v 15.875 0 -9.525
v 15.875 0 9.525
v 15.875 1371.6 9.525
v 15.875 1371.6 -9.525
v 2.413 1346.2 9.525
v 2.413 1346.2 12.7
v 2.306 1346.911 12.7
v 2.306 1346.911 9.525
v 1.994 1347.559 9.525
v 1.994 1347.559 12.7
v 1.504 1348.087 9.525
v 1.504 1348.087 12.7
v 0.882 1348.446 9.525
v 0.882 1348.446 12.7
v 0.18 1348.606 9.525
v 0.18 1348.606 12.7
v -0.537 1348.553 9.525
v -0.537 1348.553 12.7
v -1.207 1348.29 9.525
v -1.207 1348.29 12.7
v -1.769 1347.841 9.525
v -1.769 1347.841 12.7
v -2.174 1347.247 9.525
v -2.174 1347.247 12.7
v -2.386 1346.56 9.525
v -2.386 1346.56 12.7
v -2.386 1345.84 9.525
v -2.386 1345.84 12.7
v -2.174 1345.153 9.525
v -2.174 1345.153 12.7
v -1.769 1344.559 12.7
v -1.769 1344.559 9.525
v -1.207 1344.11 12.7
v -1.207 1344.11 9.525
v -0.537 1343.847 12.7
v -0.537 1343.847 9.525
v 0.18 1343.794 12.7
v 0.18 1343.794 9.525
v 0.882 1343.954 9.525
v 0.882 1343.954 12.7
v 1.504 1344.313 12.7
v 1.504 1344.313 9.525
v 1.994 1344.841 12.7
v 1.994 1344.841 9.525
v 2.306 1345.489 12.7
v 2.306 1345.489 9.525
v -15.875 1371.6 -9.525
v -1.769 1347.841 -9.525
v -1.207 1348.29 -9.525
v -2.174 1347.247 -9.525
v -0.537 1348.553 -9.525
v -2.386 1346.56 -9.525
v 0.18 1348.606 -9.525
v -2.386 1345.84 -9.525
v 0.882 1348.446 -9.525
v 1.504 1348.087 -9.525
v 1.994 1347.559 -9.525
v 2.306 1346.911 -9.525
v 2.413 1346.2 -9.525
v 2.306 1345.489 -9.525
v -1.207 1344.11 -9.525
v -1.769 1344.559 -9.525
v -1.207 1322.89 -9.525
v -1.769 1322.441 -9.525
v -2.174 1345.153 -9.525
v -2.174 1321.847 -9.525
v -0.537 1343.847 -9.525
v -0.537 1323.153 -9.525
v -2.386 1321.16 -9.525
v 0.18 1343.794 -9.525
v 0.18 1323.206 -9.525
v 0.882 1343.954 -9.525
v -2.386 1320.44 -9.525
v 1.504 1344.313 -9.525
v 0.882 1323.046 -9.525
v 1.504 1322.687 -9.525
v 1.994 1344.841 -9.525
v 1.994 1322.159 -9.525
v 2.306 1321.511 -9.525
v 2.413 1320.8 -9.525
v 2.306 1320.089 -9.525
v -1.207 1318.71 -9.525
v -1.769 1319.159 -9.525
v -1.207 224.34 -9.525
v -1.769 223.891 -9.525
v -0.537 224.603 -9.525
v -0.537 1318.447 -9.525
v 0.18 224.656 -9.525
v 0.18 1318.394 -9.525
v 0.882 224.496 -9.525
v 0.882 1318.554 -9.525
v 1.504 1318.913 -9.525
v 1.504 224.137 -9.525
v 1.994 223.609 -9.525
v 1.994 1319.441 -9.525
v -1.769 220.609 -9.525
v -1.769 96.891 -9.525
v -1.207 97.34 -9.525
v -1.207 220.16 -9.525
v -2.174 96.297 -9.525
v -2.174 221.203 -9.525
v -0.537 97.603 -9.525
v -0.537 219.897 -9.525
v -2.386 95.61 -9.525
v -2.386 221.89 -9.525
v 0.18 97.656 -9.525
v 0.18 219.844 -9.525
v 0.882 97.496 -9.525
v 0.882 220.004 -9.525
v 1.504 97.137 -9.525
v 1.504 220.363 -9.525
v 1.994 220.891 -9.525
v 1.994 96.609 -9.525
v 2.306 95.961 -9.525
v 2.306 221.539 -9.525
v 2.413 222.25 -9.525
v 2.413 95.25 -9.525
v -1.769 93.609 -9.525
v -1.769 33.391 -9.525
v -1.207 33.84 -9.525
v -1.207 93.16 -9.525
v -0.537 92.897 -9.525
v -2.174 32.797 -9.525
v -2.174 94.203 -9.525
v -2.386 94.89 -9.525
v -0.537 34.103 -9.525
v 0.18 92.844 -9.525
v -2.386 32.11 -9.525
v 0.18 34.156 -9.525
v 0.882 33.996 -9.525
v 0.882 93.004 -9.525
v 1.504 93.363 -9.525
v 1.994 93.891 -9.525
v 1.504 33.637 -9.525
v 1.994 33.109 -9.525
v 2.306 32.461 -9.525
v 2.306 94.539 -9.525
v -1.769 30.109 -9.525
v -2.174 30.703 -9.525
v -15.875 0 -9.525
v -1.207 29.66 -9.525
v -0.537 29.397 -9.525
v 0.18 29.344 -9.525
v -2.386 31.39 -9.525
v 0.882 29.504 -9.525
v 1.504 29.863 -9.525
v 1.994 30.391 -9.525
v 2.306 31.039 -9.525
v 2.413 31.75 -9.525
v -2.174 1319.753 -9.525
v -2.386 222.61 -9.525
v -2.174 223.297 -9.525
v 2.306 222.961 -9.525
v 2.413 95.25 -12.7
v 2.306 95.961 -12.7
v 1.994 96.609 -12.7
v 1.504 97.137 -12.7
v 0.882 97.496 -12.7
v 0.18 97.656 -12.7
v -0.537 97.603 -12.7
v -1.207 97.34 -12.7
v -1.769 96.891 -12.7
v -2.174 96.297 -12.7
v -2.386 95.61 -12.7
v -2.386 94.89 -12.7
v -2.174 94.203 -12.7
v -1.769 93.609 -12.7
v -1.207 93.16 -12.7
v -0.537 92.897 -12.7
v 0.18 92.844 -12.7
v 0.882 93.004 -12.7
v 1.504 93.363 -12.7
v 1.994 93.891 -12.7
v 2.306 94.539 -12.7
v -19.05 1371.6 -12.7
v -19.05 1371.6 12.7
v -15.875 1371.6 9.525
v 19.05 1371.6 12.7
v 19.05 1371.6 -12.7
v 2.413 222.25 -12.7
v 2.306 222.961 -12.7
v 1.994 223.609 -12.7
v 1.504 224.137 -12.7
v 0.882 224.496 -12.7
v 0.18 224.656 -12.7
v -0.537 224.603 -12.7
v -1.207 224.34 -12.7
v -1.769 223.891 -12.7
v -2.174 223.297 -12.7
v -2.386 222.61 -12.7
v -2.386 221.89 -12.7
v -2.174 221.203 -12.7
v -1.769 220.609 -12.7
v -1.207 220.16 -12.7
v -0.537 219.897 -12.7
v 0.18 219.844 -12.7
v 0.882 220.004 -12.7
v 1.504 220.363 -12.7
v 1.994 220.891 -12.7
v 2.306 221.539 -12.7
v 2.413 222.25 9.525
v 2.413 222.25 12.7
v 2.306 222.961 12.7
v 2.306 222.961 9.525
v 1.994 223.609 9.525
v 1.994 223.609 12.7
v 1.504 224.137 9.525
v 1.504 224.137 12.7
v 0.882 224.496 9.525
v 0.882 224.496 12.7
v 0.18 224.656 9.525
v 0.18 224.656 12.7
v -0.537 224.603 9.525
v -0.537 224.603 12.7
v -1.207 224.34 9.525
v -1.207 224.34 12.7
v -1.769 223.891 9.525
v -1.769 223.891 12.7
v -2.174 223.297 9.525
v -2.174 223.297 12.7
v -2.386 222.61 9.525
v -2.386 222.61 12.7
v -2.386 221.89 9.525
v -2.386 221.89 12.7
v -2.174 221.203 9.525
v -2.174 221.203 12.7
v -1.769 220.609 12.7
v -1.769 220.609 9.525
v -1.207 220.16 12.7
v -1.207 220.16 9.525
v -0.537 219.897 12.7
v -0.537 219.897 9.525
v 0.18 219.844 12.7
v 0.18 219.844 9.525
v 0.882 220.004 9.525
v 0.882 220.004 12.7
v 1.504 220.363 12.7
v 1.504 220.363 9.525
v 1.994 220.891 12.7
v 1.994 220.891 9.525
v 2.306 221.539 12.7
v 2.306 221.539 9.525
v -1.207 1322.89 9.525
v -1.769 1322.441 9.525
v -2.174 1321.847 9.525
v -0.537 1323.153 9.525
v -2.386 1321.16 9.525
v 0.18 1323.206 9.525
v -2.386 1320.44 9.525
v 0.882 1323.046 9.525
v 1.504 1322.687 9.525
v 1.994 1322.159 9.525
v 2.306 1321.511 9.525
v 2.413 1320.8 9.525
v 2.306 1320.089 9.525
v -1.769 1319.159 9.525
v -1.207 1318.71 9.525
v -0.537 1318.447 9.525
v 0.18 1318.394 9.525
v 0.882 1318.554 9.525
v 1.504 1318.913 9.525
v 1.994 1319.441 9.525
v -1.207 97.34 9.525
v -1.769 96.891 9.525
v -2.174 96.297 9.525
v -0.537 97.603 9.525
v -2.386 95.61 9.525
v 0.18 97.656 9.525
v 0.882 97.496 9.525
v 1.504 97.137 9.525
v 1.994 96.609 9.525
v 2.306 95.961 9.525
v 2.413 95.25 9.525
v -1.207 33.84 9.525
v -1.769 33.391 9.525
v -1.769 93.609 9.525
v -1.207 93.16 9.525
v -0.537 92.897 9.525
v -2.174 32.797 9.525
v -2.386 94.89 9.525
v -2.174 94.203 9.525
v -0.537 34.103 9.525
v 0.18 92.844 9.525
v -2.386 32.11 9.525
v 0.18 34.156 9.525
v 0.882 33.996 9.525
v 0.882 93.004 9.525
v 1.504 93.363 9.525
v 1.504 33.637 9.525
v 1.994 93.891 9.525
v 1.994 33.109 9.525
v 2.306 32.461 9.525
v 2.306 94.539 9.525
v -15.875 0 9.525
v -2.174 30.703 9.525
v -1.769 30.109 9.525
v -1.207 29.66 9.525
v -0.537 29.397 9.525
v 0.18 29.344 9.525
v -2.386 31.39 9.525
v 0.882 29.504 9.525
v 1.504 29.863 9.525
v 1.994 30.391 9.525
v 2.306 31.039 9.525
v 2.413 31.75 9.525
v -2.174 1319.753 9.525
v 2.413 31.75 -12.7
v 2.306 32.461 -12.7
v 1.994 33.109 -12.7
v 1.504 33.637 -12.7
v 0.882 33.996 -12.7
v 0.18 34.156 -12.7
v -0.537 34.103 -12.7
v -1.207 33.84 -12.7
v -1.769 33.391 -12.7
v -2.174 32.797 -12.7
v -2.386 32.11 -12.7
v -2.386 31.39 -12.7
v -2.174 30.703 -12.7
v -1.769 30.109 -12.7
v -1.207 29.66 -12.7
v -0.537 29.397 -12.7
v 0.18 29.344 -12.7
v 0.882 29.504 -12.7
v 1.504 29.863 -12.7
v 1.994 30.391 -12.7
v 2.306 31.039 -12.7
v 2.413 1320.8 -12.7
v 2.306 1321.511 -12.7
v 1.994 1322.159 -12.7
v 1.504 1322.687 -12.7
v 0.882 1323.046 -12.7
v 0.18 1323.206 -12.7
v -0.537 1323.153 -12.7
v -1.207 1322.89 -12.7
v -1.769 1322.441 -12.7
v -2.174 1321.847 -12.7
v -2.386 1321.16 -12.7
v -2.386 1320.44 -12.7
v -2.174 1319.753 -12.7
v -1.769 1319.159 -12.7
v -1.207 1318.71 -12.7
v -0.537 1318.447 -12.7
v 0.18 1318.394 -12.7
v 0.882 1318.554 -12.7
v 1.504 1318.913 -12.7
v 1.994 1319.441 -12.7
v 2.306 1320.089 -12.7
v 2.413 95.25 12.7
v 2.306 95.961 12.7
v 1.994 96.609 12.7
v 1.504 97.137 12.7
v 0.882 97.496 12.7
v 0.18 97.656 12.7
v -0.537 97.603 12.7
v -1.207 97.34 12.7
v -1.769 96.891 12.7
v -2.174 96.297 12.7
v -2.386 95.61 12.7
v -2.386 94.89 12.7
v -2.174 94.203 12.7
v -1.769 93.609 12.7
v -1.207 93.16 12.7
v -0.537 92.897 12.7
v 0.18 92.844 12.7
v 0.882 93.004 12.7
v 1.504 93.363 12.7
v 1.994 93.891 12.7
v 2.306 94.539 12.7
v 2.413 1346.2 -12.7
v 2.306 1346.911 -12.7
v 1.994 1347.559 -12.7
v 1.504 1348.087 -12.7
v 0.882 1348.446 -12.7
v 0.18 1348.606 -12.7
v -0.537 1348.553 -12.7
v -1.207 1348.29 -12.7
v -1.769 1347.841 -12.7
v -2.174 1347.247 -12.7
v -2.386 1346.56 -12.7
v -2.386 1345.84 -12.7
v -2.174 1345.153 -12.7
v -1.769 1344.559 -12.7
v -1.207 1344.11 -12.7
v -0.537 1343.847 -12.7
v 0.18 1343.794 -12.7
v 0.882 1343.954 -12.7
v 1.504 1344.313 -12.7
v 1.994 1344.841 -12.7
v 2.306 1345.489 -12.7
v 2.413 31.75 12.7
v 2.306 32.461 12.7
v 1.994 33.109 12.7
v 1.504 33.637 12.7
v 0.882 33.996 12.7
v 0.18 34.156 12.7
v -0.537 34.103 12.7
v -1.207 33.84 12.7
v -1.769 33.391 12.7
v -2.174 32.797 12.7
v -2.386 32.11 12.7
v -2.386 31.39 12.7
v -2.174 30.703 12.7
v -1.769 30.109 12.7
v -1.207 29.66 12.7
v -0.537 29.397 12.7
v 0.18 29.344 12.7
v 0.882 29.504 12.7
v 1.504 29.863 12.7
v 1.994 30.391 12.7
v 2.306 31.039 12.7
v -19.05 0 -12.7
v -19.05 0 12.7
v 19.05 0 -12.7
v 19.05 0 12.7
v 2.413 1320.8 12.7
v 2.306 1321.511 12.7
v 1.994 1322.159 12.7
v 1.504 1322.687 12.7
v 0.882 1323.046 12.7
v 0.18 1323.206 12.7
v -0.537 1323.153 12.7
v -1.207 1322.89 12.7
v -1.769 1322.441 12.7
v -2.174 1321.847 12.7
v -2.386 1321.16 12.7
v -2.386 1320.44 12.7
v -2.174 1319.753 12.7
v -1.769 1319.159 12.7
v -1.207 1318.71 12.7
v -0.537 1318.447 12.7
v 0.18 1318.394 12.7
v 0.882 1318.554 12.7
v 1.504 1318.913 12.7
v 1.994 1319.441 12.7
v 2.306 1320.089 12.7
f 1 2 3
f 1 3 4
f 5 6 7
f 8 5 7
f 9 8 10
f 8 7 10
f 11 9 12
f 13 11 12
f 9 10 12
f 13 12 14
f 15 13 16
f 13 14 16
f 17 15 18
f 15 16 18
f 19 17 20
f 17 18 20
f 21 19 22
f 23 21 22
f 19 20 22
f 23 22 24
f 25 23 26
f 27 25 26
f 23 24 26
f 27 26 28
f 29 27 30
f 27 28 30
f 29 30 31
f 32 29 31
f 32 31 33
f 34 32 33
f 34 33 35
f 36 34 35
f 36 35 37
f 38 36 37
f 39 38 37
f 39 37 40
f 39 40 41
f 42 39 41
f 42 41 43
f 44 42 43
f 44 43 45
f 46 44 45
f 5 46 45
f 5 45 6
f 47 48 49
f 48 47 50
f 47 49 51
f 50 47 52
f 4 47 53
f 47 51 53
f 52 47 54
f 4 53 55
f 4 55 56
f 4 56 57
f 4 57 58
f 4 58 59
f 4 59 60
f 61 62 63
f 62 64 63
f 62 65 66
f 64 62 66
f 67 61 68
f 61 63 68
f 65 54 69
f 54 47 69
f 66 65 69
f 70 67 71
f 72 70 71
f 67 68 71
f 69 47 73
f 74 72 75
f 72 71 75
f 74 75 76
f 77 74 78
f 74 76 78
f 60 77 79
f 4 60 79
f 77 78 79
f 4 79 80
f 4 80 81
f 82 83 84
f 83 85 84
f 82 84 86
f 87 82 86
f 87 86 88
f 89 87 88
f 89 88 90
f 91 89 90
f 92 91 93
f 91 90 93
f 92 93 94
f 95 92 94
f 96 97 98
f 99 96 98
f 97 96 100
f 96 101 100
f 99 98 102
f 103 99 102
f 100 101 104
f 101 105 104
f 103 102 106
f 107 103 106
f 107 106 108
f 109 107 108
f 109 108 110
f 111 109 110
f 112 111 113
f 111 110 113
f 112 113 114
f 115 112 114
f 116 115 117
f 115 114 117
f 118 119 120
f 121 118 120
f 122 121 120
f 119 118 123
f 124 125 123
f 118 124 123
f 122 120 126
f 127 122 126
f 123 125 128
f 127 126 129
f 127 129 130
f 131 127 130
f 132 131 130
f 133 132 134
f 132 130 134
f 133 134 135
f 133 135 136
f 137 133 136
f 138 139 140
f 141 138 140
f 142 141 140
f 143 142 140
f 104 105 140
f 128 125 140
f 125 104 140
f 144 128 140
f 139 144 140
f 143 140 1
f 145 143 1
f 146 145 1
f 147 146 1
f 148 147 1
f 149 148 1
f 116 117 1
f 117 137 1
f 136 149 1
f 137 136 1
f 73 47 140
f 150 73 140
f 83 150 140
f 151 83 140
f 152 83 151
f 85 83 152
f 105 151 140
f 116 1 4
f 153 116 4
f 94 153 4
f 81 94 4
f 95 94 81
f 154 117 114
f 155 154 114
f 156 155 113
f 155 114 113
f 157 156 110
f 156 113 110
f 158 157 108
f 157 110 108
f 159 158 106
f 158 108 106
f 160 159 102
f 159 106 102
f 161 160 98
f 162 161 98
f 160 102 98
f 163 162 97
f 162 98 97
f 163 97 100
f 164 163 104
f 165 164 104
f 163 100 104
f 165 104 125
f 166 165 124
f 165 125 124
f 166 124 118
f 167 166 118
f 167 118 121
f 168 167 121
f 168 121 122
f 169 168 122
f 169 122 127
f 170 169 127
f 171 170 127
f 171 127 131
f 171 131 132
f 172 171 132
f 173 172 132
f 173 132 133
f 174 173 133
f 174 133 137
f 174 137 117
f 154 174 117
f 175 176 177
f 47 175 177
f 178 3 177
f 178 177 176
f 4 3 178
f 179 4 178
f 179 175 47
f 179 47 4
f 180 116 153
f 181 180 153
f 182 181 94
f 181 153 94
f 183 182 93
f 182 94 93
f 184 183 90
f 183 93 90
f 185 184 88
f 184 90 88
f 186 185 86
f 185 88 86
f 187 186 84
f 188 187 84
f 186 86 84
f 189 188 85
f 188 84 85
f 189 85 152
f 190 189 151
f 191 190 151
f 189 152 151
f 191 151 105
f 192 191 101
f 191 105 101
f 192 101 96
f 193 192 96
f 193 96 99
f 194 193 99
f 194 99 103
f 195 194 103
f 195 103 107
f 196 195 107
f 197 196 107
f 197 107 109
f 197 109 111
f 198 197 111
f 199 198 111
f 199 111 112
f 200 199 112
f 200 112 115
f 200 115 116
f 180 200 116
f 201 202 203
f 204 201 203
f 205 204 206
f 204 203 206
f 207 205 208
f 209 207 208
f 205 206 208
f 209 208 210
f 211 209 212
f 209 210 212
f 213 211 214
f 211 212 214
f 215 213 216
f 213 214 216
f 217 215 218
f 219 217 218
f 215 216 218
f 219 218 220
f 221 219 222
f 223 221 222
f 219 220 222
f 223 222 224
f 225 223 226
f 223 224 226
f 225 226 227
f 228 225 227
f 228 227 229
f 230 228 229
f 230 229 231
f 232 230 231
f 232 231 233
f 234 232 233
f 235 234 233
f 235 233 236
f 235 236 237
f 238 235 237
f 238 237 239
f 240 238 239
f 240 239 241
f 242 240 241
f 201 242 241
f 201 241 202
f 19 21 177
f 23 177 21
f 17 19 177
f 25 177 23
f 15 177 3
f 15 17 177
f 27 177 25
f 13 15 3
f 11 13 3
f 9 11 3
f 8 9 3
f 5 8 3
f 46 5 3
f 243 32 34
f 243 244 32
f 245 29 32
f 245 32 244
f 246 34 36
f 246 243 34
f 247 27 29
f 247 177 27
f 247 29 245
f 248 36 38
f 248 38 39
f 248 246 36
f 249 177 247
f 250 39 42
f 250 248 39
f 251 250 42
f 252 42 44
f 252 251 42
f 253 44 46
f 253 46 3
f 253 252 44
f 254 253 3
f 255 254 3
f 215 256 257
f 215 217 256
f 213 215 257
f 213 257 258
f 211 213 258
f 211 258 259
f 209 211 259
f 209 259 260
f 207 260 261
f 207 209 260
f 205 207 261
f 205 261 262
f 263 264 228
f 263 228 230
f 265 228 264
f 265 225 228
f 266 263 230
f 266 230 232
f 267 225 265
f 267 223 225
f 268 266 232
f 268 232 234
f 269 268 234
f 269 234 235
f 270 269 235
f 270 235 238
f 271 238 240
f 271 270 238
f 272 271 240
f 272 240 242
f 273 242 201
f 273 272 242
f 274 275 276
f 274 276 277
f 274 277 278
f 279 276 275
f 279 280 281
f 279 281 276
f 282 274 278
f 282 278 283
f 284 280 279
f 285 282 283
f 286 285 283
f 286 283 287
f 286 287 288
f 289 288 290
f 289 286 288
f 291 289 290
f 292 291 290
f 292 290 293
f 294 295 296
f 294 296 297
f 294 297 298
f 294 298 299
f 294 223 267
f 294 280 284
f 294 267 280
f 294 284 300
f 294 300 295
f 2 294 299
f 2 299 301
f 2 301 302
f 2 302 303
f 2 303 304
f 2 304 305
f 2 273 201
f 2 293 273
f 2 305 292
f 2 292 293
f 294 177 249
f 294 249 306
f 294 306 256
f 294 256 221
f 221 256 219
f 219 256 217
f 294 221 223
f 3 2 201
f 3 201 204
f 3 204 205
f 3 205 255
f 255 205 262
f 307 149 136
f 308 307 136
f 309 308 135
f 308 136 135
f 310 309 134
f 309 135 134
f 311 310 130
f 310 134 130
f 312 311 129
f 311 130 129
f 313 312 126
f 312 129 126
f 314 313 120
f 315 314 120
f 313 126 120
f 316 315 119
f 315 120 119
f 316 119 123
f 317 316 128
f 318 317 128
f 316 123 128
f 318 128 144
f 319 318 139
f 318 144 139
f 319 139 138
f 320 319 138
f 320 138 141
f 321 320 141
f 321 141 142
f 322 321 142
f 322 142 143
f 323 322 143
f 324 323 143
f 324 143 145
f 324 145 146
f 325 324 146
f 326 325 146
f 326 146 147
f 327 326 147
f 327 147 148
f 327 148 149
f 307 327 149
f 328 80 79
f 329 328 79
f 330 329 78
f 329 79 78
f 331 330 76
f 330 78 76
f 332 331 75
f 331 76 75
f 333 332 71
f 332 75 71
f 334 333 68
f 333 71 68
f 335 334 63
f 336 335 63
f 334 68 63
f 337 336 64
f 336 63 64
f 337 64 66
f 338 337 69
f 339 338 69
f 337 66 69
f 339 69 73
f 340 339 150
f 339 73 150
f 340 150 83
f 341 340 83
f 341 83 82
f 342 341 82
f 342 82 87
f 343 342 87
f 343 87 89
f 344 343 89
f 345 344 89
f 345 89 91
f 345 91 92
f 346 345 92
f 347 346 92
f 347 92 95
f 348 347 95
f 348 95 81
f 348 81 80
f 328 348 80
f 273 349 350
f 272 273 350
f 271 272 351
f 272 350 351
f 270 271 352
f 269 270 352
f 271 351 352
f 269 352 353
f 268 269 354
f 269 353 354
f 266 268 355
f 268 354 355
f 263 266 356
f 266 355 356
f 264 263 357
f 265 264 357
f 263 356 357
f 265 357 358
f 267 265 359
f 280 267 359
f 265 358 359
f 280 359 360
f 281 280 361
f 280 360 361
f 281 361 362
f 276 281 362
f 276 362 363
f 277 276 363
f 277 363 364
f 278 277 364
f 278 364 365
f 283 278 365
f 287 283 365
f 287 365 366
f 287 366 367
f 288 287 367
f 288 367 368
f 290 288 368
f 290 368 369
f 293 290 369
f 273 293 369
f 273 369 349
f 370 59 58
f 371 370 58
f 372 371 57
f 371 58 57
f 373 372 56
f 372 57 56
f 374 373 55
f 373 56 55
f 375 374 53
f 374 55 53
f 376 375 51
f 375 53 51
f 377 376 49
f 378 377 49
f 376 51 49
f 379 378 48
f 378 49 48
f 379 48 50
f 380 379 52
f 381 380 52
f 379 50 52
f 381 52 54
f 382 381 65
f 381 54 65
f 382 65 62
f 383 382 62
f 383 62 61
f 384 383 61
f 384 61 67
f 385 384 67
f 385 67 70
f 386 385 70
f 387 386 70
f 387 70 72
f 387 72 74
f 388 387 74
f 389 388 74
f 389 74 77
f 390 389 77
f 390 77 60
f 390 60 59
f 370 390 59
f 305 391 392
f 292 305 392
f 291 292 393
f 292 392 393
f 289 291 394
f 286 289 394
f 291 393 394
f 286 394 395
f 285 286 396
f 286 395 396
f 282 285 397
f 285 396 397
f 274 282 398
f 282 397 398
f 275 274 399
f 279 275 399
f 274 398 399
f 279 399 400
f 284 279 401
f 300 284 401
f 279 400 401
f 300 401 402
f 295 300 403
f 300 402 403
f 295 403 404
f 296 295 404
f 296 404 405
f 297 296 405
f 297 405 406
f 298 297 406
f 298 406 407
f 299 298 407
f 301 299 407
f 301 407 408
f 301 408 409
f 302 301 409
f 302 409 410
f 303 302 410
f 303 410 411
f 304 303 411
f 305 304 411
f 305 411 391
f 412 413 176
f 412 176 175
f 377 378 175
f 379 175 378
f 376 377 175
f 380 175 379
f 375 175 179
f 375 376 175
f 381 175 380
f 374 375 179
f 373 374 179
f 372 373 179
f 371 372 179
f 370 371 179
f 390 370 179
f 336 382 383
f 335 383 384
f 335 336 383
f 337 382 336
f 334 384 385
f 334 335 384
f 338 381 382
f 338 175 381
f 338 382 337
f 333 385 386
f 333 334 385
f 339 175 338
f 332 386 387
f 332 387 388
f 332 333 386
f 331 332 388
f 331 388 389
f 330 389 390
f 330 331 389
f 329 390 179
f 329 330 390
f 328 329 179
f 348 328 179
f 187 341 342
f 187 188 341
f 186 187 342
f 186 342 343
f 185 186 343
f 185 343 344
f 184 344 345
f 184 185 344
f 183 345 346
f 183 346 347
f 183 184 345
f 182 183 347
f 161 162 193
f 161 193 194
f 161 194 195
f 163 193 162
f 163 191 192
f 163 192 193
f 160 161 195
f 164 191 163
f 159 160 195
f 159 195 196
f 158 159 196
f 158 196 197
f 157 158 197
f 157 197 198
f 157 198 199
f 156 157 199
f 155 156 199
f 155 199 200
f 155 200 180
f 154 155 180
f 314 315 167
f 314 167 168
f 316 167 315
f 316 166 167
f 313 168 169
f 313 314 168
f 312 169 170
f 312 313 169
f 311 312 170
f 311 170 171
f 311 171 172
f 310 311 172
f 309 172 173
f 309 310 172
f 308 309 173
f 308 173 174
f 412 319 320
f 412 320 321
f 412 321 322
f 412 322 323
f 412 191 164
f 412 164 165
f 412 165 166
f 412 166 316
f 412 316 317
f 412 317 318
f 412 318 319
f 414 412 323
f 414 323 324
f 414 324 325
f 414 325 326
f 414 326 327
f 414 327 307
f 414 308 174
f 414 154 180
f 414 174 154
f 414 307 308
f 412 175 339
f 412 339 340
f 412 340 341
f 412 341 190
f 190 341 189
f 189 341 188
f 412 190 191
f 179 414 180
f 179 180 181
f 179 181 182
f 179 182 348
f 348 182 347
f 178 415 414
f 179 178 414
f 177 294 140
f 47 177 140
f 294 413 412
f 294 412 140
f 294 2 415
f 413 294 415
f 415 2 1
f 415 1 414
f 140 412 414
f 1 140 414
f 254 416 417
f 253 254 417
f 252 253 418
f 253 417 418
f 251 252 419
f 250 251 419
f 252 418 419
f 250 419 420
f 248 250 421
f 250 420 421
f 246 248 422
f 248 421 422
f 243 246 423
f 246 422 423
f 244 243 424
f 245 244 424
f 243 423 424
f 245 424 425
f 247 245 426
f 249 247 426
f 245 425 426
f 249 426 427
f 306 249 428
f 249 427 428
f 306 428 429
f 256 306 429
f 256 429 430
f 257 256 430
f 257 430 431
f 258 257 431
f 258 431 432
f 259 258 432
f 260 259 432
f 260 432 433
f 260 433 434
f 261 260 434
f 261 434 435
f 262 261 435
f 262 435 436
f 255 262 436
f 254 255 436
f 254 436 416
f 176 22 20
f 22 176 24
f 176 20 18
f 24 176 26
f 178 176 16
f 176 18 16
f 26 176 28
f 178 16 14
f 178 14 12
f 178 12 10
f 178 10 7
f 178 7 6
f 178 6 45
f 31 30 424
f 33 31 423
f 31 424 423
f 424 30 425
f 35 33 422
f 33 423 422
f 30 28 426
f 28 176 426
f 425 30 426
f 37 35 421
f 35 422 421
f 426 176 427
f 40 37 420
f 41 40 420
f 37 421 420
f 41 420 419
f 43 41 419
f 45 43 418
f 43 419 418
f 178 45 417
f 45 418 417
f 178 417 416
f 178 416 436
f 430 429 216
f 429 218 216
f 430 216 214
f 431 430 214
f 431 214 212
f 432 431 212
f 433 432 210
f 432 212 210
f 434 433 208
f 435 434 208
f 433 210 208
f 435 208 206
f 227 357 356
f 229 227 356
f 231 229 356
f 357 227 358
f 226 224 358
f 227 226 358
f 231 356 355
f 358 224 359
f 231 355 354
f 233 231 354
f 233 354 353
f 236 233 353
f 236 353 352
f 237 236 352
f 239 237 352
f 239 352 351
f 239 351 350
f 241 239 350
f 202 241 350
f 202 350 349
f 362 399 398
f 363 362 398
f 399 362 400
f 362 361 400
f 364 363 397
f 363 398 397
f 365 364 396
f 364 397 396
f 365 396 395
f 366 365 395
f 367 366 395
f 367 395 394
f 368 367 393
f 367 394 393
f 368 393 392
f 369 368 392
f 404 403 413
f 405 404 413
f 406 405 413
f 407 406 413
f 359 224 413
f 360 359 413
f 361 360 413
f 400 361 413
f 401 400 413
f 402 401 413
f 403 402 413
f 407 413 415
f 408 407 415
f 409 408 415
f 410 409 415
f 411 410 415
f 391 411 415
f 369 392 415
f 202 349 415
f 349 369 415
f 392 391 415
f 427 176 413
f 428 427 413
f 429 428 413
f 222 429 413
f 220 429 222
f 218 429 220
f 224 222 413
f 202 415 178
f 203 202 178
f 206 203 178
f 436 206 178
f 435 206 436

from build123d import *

# Parameters (mm, degrees)
SKETCH2_W           = 38.1
SKETCH2_H           = 25.4
SKETCH2_W_2         = 31.75
SKETCH2_H_2         = 19.05
BOSS_EXTRUDE1_DEPTH = 1371.6
CUT_EXTRUDE1_REACH  = 1373.967
SKETCH3_R           = 2.413
CUT_EXTRUDE2_REACH  = 1373.967
SKETCH4_R           = 2.413


with BuildPart() as part:
    # Sketch2 → Boss-Extrude1 (new body)
    with BuildSketch(Plane(origin=(0, 0, 0), x_dir=(1, 0, 0), z_dir=(0, 1, 0))):
        Rectangle(SKETCH2_W, SKETCH2_H)
        Rectangle(SKETCH2_W_2, SKETCH2_H_2, mode=Mode.SUBTRACT)
    extrude(amount=BOSS_EXTRUDE1_DEPTH)

    # Cut-Extrude1: up to this face of the body (flat: up to its plane)
    cut_extrude1_end = Plane(part.part.faces().sort_by_distance((0, 685.8, -12.7))[0])
    # Sketch3 → Cut-Extrude1 (cut, up to the picked face)
    with BuildSketch(Plane.XY.offset(12.7), mode=Mode.PRIVATE) as cut_extrude1_sk1:
        with Locations((0, 31.75)):
            Circle(SKETCH3_R)
    cut_extrude1_tool1 = split(extrude(cut_extrude1_sk1.sketch, amount=-CUT_EXTRUDE1_REACH, mode=Mode.PRIVATE), bisect_by=cut_extrude1_end, keep=Keep.BOTH, mode=Mode.PRIVATE)
    # Sketch3 → Cut-Extrude1 (cut, up to the picked face)
    with BuildSketch(Plane.XY.offset(12.7), mode=Mode.PRIVATE) as cut_extrude1_sk2:
        with Locations((0, 222.25)):
            Circle(SKETCH3_R)
    cut_extrude1_tool2 = split(extrude(cut_extrude1_sk2.sketch, amount=-CUT_EXTRUDE1_REACH, mode=Mode.PRIVATE), bisect_by=cut_extrude1_end, keep=Keep.BOTH, mode=Mode.PRIVATE)
    # Sketch3 → Cut-Extrude1 (cut, up to the picked face)
    with BuildSketch(Plane.XY.offset(12.7), mode=Mode.PRIVATE) as cut_extrude1_sk3:
        with Locations((0, 95.25)):
            Circle(SKETCH3_R)
    cut_extrude1_tool3 = split(extrude(cut_extrude1_sk3.sketch, amount=-CUT_EXTRUDE1_REACH, mode=Mode.PRIVATE), bisect_by=cut_extrude1_end, keep=Keep.BOTH, mode=Mode.PRIVATE)
    add(cut_extrude1_tool1.solids().sort_by(Axis((0, 31.75, 12.7), (0, 0, -1)))[0], mode=Mode.SUBTRACT)
    add(cut_extrude1_tool2.solids().sort_by(Axis((0, 222.25, 12.7), (0, 0, -1)))[0], mode=Mode.SUBTRACT)
    add(cut_extrude1_tool3.solids().sort_by(Axis((0, 95.25, 12.7), (0, 0, -1)))[0], mode=Mode.SUBTRACT)

    # Cut-Extrude2: up to this face of the body (flat: up to its plane)
    cut_extrude2_end = Plane(part.part.faces().sort_by_distance((0, 686.398541634, -12.7))[0])
    # Sketch4 → Cut-Extrude2 (cut, up to the picked face)
    with BuildSketch(Plane.XY.offset(12.7), mode=Mode.PRIVATE) as cut_extrude2_sk1:
        with Locations((0, 1346.2)):
            Circle(SKETCH4_R)
    cut_extrude2_tool1 = split(extrude(cut_extrude2_sk1.sketch, amount=-CUT_EXTRUDE2_REACH, mode=Mode.PRIVATE), bisect_by=cut_extrude2_end, keep=Keep.BOTH, mode=Mode.PRIVATE)
    # Sketch4 → Cut-Extrude2 (cut, up to the picked face)
    with BuildSketch(Plane.XY.offset(12.7), mode=Mode.PRIVATE) as cut_extrude2_sk2:
        with Locations((0, 1320.8)):
            Circle(SKETCH4_R)
    cut_extrude2_tool2 = split(extrude(cut_extrude2_sk2.sketch, amount=-CUT_EXTRUDE2_REACH, mode=Mode.PRIVATE), bisect_by=cut_extrude2_end, keep=Keep.BOTH, mode=Mode.PRIVATE)
    add(cut_extrude2_tool1.solids().sort_by(Axis((0, 1346.2, 12.7), (0, 0, -1)))[0], mode=Mode.SUBTRACT)
    add(cut_extrude2_tool2.solids().sort_by(Axis((0, 1320.8, 12.7), (0, 0, -1)))[0], mode=Mode.SUBTRACT)


solid = part.part
